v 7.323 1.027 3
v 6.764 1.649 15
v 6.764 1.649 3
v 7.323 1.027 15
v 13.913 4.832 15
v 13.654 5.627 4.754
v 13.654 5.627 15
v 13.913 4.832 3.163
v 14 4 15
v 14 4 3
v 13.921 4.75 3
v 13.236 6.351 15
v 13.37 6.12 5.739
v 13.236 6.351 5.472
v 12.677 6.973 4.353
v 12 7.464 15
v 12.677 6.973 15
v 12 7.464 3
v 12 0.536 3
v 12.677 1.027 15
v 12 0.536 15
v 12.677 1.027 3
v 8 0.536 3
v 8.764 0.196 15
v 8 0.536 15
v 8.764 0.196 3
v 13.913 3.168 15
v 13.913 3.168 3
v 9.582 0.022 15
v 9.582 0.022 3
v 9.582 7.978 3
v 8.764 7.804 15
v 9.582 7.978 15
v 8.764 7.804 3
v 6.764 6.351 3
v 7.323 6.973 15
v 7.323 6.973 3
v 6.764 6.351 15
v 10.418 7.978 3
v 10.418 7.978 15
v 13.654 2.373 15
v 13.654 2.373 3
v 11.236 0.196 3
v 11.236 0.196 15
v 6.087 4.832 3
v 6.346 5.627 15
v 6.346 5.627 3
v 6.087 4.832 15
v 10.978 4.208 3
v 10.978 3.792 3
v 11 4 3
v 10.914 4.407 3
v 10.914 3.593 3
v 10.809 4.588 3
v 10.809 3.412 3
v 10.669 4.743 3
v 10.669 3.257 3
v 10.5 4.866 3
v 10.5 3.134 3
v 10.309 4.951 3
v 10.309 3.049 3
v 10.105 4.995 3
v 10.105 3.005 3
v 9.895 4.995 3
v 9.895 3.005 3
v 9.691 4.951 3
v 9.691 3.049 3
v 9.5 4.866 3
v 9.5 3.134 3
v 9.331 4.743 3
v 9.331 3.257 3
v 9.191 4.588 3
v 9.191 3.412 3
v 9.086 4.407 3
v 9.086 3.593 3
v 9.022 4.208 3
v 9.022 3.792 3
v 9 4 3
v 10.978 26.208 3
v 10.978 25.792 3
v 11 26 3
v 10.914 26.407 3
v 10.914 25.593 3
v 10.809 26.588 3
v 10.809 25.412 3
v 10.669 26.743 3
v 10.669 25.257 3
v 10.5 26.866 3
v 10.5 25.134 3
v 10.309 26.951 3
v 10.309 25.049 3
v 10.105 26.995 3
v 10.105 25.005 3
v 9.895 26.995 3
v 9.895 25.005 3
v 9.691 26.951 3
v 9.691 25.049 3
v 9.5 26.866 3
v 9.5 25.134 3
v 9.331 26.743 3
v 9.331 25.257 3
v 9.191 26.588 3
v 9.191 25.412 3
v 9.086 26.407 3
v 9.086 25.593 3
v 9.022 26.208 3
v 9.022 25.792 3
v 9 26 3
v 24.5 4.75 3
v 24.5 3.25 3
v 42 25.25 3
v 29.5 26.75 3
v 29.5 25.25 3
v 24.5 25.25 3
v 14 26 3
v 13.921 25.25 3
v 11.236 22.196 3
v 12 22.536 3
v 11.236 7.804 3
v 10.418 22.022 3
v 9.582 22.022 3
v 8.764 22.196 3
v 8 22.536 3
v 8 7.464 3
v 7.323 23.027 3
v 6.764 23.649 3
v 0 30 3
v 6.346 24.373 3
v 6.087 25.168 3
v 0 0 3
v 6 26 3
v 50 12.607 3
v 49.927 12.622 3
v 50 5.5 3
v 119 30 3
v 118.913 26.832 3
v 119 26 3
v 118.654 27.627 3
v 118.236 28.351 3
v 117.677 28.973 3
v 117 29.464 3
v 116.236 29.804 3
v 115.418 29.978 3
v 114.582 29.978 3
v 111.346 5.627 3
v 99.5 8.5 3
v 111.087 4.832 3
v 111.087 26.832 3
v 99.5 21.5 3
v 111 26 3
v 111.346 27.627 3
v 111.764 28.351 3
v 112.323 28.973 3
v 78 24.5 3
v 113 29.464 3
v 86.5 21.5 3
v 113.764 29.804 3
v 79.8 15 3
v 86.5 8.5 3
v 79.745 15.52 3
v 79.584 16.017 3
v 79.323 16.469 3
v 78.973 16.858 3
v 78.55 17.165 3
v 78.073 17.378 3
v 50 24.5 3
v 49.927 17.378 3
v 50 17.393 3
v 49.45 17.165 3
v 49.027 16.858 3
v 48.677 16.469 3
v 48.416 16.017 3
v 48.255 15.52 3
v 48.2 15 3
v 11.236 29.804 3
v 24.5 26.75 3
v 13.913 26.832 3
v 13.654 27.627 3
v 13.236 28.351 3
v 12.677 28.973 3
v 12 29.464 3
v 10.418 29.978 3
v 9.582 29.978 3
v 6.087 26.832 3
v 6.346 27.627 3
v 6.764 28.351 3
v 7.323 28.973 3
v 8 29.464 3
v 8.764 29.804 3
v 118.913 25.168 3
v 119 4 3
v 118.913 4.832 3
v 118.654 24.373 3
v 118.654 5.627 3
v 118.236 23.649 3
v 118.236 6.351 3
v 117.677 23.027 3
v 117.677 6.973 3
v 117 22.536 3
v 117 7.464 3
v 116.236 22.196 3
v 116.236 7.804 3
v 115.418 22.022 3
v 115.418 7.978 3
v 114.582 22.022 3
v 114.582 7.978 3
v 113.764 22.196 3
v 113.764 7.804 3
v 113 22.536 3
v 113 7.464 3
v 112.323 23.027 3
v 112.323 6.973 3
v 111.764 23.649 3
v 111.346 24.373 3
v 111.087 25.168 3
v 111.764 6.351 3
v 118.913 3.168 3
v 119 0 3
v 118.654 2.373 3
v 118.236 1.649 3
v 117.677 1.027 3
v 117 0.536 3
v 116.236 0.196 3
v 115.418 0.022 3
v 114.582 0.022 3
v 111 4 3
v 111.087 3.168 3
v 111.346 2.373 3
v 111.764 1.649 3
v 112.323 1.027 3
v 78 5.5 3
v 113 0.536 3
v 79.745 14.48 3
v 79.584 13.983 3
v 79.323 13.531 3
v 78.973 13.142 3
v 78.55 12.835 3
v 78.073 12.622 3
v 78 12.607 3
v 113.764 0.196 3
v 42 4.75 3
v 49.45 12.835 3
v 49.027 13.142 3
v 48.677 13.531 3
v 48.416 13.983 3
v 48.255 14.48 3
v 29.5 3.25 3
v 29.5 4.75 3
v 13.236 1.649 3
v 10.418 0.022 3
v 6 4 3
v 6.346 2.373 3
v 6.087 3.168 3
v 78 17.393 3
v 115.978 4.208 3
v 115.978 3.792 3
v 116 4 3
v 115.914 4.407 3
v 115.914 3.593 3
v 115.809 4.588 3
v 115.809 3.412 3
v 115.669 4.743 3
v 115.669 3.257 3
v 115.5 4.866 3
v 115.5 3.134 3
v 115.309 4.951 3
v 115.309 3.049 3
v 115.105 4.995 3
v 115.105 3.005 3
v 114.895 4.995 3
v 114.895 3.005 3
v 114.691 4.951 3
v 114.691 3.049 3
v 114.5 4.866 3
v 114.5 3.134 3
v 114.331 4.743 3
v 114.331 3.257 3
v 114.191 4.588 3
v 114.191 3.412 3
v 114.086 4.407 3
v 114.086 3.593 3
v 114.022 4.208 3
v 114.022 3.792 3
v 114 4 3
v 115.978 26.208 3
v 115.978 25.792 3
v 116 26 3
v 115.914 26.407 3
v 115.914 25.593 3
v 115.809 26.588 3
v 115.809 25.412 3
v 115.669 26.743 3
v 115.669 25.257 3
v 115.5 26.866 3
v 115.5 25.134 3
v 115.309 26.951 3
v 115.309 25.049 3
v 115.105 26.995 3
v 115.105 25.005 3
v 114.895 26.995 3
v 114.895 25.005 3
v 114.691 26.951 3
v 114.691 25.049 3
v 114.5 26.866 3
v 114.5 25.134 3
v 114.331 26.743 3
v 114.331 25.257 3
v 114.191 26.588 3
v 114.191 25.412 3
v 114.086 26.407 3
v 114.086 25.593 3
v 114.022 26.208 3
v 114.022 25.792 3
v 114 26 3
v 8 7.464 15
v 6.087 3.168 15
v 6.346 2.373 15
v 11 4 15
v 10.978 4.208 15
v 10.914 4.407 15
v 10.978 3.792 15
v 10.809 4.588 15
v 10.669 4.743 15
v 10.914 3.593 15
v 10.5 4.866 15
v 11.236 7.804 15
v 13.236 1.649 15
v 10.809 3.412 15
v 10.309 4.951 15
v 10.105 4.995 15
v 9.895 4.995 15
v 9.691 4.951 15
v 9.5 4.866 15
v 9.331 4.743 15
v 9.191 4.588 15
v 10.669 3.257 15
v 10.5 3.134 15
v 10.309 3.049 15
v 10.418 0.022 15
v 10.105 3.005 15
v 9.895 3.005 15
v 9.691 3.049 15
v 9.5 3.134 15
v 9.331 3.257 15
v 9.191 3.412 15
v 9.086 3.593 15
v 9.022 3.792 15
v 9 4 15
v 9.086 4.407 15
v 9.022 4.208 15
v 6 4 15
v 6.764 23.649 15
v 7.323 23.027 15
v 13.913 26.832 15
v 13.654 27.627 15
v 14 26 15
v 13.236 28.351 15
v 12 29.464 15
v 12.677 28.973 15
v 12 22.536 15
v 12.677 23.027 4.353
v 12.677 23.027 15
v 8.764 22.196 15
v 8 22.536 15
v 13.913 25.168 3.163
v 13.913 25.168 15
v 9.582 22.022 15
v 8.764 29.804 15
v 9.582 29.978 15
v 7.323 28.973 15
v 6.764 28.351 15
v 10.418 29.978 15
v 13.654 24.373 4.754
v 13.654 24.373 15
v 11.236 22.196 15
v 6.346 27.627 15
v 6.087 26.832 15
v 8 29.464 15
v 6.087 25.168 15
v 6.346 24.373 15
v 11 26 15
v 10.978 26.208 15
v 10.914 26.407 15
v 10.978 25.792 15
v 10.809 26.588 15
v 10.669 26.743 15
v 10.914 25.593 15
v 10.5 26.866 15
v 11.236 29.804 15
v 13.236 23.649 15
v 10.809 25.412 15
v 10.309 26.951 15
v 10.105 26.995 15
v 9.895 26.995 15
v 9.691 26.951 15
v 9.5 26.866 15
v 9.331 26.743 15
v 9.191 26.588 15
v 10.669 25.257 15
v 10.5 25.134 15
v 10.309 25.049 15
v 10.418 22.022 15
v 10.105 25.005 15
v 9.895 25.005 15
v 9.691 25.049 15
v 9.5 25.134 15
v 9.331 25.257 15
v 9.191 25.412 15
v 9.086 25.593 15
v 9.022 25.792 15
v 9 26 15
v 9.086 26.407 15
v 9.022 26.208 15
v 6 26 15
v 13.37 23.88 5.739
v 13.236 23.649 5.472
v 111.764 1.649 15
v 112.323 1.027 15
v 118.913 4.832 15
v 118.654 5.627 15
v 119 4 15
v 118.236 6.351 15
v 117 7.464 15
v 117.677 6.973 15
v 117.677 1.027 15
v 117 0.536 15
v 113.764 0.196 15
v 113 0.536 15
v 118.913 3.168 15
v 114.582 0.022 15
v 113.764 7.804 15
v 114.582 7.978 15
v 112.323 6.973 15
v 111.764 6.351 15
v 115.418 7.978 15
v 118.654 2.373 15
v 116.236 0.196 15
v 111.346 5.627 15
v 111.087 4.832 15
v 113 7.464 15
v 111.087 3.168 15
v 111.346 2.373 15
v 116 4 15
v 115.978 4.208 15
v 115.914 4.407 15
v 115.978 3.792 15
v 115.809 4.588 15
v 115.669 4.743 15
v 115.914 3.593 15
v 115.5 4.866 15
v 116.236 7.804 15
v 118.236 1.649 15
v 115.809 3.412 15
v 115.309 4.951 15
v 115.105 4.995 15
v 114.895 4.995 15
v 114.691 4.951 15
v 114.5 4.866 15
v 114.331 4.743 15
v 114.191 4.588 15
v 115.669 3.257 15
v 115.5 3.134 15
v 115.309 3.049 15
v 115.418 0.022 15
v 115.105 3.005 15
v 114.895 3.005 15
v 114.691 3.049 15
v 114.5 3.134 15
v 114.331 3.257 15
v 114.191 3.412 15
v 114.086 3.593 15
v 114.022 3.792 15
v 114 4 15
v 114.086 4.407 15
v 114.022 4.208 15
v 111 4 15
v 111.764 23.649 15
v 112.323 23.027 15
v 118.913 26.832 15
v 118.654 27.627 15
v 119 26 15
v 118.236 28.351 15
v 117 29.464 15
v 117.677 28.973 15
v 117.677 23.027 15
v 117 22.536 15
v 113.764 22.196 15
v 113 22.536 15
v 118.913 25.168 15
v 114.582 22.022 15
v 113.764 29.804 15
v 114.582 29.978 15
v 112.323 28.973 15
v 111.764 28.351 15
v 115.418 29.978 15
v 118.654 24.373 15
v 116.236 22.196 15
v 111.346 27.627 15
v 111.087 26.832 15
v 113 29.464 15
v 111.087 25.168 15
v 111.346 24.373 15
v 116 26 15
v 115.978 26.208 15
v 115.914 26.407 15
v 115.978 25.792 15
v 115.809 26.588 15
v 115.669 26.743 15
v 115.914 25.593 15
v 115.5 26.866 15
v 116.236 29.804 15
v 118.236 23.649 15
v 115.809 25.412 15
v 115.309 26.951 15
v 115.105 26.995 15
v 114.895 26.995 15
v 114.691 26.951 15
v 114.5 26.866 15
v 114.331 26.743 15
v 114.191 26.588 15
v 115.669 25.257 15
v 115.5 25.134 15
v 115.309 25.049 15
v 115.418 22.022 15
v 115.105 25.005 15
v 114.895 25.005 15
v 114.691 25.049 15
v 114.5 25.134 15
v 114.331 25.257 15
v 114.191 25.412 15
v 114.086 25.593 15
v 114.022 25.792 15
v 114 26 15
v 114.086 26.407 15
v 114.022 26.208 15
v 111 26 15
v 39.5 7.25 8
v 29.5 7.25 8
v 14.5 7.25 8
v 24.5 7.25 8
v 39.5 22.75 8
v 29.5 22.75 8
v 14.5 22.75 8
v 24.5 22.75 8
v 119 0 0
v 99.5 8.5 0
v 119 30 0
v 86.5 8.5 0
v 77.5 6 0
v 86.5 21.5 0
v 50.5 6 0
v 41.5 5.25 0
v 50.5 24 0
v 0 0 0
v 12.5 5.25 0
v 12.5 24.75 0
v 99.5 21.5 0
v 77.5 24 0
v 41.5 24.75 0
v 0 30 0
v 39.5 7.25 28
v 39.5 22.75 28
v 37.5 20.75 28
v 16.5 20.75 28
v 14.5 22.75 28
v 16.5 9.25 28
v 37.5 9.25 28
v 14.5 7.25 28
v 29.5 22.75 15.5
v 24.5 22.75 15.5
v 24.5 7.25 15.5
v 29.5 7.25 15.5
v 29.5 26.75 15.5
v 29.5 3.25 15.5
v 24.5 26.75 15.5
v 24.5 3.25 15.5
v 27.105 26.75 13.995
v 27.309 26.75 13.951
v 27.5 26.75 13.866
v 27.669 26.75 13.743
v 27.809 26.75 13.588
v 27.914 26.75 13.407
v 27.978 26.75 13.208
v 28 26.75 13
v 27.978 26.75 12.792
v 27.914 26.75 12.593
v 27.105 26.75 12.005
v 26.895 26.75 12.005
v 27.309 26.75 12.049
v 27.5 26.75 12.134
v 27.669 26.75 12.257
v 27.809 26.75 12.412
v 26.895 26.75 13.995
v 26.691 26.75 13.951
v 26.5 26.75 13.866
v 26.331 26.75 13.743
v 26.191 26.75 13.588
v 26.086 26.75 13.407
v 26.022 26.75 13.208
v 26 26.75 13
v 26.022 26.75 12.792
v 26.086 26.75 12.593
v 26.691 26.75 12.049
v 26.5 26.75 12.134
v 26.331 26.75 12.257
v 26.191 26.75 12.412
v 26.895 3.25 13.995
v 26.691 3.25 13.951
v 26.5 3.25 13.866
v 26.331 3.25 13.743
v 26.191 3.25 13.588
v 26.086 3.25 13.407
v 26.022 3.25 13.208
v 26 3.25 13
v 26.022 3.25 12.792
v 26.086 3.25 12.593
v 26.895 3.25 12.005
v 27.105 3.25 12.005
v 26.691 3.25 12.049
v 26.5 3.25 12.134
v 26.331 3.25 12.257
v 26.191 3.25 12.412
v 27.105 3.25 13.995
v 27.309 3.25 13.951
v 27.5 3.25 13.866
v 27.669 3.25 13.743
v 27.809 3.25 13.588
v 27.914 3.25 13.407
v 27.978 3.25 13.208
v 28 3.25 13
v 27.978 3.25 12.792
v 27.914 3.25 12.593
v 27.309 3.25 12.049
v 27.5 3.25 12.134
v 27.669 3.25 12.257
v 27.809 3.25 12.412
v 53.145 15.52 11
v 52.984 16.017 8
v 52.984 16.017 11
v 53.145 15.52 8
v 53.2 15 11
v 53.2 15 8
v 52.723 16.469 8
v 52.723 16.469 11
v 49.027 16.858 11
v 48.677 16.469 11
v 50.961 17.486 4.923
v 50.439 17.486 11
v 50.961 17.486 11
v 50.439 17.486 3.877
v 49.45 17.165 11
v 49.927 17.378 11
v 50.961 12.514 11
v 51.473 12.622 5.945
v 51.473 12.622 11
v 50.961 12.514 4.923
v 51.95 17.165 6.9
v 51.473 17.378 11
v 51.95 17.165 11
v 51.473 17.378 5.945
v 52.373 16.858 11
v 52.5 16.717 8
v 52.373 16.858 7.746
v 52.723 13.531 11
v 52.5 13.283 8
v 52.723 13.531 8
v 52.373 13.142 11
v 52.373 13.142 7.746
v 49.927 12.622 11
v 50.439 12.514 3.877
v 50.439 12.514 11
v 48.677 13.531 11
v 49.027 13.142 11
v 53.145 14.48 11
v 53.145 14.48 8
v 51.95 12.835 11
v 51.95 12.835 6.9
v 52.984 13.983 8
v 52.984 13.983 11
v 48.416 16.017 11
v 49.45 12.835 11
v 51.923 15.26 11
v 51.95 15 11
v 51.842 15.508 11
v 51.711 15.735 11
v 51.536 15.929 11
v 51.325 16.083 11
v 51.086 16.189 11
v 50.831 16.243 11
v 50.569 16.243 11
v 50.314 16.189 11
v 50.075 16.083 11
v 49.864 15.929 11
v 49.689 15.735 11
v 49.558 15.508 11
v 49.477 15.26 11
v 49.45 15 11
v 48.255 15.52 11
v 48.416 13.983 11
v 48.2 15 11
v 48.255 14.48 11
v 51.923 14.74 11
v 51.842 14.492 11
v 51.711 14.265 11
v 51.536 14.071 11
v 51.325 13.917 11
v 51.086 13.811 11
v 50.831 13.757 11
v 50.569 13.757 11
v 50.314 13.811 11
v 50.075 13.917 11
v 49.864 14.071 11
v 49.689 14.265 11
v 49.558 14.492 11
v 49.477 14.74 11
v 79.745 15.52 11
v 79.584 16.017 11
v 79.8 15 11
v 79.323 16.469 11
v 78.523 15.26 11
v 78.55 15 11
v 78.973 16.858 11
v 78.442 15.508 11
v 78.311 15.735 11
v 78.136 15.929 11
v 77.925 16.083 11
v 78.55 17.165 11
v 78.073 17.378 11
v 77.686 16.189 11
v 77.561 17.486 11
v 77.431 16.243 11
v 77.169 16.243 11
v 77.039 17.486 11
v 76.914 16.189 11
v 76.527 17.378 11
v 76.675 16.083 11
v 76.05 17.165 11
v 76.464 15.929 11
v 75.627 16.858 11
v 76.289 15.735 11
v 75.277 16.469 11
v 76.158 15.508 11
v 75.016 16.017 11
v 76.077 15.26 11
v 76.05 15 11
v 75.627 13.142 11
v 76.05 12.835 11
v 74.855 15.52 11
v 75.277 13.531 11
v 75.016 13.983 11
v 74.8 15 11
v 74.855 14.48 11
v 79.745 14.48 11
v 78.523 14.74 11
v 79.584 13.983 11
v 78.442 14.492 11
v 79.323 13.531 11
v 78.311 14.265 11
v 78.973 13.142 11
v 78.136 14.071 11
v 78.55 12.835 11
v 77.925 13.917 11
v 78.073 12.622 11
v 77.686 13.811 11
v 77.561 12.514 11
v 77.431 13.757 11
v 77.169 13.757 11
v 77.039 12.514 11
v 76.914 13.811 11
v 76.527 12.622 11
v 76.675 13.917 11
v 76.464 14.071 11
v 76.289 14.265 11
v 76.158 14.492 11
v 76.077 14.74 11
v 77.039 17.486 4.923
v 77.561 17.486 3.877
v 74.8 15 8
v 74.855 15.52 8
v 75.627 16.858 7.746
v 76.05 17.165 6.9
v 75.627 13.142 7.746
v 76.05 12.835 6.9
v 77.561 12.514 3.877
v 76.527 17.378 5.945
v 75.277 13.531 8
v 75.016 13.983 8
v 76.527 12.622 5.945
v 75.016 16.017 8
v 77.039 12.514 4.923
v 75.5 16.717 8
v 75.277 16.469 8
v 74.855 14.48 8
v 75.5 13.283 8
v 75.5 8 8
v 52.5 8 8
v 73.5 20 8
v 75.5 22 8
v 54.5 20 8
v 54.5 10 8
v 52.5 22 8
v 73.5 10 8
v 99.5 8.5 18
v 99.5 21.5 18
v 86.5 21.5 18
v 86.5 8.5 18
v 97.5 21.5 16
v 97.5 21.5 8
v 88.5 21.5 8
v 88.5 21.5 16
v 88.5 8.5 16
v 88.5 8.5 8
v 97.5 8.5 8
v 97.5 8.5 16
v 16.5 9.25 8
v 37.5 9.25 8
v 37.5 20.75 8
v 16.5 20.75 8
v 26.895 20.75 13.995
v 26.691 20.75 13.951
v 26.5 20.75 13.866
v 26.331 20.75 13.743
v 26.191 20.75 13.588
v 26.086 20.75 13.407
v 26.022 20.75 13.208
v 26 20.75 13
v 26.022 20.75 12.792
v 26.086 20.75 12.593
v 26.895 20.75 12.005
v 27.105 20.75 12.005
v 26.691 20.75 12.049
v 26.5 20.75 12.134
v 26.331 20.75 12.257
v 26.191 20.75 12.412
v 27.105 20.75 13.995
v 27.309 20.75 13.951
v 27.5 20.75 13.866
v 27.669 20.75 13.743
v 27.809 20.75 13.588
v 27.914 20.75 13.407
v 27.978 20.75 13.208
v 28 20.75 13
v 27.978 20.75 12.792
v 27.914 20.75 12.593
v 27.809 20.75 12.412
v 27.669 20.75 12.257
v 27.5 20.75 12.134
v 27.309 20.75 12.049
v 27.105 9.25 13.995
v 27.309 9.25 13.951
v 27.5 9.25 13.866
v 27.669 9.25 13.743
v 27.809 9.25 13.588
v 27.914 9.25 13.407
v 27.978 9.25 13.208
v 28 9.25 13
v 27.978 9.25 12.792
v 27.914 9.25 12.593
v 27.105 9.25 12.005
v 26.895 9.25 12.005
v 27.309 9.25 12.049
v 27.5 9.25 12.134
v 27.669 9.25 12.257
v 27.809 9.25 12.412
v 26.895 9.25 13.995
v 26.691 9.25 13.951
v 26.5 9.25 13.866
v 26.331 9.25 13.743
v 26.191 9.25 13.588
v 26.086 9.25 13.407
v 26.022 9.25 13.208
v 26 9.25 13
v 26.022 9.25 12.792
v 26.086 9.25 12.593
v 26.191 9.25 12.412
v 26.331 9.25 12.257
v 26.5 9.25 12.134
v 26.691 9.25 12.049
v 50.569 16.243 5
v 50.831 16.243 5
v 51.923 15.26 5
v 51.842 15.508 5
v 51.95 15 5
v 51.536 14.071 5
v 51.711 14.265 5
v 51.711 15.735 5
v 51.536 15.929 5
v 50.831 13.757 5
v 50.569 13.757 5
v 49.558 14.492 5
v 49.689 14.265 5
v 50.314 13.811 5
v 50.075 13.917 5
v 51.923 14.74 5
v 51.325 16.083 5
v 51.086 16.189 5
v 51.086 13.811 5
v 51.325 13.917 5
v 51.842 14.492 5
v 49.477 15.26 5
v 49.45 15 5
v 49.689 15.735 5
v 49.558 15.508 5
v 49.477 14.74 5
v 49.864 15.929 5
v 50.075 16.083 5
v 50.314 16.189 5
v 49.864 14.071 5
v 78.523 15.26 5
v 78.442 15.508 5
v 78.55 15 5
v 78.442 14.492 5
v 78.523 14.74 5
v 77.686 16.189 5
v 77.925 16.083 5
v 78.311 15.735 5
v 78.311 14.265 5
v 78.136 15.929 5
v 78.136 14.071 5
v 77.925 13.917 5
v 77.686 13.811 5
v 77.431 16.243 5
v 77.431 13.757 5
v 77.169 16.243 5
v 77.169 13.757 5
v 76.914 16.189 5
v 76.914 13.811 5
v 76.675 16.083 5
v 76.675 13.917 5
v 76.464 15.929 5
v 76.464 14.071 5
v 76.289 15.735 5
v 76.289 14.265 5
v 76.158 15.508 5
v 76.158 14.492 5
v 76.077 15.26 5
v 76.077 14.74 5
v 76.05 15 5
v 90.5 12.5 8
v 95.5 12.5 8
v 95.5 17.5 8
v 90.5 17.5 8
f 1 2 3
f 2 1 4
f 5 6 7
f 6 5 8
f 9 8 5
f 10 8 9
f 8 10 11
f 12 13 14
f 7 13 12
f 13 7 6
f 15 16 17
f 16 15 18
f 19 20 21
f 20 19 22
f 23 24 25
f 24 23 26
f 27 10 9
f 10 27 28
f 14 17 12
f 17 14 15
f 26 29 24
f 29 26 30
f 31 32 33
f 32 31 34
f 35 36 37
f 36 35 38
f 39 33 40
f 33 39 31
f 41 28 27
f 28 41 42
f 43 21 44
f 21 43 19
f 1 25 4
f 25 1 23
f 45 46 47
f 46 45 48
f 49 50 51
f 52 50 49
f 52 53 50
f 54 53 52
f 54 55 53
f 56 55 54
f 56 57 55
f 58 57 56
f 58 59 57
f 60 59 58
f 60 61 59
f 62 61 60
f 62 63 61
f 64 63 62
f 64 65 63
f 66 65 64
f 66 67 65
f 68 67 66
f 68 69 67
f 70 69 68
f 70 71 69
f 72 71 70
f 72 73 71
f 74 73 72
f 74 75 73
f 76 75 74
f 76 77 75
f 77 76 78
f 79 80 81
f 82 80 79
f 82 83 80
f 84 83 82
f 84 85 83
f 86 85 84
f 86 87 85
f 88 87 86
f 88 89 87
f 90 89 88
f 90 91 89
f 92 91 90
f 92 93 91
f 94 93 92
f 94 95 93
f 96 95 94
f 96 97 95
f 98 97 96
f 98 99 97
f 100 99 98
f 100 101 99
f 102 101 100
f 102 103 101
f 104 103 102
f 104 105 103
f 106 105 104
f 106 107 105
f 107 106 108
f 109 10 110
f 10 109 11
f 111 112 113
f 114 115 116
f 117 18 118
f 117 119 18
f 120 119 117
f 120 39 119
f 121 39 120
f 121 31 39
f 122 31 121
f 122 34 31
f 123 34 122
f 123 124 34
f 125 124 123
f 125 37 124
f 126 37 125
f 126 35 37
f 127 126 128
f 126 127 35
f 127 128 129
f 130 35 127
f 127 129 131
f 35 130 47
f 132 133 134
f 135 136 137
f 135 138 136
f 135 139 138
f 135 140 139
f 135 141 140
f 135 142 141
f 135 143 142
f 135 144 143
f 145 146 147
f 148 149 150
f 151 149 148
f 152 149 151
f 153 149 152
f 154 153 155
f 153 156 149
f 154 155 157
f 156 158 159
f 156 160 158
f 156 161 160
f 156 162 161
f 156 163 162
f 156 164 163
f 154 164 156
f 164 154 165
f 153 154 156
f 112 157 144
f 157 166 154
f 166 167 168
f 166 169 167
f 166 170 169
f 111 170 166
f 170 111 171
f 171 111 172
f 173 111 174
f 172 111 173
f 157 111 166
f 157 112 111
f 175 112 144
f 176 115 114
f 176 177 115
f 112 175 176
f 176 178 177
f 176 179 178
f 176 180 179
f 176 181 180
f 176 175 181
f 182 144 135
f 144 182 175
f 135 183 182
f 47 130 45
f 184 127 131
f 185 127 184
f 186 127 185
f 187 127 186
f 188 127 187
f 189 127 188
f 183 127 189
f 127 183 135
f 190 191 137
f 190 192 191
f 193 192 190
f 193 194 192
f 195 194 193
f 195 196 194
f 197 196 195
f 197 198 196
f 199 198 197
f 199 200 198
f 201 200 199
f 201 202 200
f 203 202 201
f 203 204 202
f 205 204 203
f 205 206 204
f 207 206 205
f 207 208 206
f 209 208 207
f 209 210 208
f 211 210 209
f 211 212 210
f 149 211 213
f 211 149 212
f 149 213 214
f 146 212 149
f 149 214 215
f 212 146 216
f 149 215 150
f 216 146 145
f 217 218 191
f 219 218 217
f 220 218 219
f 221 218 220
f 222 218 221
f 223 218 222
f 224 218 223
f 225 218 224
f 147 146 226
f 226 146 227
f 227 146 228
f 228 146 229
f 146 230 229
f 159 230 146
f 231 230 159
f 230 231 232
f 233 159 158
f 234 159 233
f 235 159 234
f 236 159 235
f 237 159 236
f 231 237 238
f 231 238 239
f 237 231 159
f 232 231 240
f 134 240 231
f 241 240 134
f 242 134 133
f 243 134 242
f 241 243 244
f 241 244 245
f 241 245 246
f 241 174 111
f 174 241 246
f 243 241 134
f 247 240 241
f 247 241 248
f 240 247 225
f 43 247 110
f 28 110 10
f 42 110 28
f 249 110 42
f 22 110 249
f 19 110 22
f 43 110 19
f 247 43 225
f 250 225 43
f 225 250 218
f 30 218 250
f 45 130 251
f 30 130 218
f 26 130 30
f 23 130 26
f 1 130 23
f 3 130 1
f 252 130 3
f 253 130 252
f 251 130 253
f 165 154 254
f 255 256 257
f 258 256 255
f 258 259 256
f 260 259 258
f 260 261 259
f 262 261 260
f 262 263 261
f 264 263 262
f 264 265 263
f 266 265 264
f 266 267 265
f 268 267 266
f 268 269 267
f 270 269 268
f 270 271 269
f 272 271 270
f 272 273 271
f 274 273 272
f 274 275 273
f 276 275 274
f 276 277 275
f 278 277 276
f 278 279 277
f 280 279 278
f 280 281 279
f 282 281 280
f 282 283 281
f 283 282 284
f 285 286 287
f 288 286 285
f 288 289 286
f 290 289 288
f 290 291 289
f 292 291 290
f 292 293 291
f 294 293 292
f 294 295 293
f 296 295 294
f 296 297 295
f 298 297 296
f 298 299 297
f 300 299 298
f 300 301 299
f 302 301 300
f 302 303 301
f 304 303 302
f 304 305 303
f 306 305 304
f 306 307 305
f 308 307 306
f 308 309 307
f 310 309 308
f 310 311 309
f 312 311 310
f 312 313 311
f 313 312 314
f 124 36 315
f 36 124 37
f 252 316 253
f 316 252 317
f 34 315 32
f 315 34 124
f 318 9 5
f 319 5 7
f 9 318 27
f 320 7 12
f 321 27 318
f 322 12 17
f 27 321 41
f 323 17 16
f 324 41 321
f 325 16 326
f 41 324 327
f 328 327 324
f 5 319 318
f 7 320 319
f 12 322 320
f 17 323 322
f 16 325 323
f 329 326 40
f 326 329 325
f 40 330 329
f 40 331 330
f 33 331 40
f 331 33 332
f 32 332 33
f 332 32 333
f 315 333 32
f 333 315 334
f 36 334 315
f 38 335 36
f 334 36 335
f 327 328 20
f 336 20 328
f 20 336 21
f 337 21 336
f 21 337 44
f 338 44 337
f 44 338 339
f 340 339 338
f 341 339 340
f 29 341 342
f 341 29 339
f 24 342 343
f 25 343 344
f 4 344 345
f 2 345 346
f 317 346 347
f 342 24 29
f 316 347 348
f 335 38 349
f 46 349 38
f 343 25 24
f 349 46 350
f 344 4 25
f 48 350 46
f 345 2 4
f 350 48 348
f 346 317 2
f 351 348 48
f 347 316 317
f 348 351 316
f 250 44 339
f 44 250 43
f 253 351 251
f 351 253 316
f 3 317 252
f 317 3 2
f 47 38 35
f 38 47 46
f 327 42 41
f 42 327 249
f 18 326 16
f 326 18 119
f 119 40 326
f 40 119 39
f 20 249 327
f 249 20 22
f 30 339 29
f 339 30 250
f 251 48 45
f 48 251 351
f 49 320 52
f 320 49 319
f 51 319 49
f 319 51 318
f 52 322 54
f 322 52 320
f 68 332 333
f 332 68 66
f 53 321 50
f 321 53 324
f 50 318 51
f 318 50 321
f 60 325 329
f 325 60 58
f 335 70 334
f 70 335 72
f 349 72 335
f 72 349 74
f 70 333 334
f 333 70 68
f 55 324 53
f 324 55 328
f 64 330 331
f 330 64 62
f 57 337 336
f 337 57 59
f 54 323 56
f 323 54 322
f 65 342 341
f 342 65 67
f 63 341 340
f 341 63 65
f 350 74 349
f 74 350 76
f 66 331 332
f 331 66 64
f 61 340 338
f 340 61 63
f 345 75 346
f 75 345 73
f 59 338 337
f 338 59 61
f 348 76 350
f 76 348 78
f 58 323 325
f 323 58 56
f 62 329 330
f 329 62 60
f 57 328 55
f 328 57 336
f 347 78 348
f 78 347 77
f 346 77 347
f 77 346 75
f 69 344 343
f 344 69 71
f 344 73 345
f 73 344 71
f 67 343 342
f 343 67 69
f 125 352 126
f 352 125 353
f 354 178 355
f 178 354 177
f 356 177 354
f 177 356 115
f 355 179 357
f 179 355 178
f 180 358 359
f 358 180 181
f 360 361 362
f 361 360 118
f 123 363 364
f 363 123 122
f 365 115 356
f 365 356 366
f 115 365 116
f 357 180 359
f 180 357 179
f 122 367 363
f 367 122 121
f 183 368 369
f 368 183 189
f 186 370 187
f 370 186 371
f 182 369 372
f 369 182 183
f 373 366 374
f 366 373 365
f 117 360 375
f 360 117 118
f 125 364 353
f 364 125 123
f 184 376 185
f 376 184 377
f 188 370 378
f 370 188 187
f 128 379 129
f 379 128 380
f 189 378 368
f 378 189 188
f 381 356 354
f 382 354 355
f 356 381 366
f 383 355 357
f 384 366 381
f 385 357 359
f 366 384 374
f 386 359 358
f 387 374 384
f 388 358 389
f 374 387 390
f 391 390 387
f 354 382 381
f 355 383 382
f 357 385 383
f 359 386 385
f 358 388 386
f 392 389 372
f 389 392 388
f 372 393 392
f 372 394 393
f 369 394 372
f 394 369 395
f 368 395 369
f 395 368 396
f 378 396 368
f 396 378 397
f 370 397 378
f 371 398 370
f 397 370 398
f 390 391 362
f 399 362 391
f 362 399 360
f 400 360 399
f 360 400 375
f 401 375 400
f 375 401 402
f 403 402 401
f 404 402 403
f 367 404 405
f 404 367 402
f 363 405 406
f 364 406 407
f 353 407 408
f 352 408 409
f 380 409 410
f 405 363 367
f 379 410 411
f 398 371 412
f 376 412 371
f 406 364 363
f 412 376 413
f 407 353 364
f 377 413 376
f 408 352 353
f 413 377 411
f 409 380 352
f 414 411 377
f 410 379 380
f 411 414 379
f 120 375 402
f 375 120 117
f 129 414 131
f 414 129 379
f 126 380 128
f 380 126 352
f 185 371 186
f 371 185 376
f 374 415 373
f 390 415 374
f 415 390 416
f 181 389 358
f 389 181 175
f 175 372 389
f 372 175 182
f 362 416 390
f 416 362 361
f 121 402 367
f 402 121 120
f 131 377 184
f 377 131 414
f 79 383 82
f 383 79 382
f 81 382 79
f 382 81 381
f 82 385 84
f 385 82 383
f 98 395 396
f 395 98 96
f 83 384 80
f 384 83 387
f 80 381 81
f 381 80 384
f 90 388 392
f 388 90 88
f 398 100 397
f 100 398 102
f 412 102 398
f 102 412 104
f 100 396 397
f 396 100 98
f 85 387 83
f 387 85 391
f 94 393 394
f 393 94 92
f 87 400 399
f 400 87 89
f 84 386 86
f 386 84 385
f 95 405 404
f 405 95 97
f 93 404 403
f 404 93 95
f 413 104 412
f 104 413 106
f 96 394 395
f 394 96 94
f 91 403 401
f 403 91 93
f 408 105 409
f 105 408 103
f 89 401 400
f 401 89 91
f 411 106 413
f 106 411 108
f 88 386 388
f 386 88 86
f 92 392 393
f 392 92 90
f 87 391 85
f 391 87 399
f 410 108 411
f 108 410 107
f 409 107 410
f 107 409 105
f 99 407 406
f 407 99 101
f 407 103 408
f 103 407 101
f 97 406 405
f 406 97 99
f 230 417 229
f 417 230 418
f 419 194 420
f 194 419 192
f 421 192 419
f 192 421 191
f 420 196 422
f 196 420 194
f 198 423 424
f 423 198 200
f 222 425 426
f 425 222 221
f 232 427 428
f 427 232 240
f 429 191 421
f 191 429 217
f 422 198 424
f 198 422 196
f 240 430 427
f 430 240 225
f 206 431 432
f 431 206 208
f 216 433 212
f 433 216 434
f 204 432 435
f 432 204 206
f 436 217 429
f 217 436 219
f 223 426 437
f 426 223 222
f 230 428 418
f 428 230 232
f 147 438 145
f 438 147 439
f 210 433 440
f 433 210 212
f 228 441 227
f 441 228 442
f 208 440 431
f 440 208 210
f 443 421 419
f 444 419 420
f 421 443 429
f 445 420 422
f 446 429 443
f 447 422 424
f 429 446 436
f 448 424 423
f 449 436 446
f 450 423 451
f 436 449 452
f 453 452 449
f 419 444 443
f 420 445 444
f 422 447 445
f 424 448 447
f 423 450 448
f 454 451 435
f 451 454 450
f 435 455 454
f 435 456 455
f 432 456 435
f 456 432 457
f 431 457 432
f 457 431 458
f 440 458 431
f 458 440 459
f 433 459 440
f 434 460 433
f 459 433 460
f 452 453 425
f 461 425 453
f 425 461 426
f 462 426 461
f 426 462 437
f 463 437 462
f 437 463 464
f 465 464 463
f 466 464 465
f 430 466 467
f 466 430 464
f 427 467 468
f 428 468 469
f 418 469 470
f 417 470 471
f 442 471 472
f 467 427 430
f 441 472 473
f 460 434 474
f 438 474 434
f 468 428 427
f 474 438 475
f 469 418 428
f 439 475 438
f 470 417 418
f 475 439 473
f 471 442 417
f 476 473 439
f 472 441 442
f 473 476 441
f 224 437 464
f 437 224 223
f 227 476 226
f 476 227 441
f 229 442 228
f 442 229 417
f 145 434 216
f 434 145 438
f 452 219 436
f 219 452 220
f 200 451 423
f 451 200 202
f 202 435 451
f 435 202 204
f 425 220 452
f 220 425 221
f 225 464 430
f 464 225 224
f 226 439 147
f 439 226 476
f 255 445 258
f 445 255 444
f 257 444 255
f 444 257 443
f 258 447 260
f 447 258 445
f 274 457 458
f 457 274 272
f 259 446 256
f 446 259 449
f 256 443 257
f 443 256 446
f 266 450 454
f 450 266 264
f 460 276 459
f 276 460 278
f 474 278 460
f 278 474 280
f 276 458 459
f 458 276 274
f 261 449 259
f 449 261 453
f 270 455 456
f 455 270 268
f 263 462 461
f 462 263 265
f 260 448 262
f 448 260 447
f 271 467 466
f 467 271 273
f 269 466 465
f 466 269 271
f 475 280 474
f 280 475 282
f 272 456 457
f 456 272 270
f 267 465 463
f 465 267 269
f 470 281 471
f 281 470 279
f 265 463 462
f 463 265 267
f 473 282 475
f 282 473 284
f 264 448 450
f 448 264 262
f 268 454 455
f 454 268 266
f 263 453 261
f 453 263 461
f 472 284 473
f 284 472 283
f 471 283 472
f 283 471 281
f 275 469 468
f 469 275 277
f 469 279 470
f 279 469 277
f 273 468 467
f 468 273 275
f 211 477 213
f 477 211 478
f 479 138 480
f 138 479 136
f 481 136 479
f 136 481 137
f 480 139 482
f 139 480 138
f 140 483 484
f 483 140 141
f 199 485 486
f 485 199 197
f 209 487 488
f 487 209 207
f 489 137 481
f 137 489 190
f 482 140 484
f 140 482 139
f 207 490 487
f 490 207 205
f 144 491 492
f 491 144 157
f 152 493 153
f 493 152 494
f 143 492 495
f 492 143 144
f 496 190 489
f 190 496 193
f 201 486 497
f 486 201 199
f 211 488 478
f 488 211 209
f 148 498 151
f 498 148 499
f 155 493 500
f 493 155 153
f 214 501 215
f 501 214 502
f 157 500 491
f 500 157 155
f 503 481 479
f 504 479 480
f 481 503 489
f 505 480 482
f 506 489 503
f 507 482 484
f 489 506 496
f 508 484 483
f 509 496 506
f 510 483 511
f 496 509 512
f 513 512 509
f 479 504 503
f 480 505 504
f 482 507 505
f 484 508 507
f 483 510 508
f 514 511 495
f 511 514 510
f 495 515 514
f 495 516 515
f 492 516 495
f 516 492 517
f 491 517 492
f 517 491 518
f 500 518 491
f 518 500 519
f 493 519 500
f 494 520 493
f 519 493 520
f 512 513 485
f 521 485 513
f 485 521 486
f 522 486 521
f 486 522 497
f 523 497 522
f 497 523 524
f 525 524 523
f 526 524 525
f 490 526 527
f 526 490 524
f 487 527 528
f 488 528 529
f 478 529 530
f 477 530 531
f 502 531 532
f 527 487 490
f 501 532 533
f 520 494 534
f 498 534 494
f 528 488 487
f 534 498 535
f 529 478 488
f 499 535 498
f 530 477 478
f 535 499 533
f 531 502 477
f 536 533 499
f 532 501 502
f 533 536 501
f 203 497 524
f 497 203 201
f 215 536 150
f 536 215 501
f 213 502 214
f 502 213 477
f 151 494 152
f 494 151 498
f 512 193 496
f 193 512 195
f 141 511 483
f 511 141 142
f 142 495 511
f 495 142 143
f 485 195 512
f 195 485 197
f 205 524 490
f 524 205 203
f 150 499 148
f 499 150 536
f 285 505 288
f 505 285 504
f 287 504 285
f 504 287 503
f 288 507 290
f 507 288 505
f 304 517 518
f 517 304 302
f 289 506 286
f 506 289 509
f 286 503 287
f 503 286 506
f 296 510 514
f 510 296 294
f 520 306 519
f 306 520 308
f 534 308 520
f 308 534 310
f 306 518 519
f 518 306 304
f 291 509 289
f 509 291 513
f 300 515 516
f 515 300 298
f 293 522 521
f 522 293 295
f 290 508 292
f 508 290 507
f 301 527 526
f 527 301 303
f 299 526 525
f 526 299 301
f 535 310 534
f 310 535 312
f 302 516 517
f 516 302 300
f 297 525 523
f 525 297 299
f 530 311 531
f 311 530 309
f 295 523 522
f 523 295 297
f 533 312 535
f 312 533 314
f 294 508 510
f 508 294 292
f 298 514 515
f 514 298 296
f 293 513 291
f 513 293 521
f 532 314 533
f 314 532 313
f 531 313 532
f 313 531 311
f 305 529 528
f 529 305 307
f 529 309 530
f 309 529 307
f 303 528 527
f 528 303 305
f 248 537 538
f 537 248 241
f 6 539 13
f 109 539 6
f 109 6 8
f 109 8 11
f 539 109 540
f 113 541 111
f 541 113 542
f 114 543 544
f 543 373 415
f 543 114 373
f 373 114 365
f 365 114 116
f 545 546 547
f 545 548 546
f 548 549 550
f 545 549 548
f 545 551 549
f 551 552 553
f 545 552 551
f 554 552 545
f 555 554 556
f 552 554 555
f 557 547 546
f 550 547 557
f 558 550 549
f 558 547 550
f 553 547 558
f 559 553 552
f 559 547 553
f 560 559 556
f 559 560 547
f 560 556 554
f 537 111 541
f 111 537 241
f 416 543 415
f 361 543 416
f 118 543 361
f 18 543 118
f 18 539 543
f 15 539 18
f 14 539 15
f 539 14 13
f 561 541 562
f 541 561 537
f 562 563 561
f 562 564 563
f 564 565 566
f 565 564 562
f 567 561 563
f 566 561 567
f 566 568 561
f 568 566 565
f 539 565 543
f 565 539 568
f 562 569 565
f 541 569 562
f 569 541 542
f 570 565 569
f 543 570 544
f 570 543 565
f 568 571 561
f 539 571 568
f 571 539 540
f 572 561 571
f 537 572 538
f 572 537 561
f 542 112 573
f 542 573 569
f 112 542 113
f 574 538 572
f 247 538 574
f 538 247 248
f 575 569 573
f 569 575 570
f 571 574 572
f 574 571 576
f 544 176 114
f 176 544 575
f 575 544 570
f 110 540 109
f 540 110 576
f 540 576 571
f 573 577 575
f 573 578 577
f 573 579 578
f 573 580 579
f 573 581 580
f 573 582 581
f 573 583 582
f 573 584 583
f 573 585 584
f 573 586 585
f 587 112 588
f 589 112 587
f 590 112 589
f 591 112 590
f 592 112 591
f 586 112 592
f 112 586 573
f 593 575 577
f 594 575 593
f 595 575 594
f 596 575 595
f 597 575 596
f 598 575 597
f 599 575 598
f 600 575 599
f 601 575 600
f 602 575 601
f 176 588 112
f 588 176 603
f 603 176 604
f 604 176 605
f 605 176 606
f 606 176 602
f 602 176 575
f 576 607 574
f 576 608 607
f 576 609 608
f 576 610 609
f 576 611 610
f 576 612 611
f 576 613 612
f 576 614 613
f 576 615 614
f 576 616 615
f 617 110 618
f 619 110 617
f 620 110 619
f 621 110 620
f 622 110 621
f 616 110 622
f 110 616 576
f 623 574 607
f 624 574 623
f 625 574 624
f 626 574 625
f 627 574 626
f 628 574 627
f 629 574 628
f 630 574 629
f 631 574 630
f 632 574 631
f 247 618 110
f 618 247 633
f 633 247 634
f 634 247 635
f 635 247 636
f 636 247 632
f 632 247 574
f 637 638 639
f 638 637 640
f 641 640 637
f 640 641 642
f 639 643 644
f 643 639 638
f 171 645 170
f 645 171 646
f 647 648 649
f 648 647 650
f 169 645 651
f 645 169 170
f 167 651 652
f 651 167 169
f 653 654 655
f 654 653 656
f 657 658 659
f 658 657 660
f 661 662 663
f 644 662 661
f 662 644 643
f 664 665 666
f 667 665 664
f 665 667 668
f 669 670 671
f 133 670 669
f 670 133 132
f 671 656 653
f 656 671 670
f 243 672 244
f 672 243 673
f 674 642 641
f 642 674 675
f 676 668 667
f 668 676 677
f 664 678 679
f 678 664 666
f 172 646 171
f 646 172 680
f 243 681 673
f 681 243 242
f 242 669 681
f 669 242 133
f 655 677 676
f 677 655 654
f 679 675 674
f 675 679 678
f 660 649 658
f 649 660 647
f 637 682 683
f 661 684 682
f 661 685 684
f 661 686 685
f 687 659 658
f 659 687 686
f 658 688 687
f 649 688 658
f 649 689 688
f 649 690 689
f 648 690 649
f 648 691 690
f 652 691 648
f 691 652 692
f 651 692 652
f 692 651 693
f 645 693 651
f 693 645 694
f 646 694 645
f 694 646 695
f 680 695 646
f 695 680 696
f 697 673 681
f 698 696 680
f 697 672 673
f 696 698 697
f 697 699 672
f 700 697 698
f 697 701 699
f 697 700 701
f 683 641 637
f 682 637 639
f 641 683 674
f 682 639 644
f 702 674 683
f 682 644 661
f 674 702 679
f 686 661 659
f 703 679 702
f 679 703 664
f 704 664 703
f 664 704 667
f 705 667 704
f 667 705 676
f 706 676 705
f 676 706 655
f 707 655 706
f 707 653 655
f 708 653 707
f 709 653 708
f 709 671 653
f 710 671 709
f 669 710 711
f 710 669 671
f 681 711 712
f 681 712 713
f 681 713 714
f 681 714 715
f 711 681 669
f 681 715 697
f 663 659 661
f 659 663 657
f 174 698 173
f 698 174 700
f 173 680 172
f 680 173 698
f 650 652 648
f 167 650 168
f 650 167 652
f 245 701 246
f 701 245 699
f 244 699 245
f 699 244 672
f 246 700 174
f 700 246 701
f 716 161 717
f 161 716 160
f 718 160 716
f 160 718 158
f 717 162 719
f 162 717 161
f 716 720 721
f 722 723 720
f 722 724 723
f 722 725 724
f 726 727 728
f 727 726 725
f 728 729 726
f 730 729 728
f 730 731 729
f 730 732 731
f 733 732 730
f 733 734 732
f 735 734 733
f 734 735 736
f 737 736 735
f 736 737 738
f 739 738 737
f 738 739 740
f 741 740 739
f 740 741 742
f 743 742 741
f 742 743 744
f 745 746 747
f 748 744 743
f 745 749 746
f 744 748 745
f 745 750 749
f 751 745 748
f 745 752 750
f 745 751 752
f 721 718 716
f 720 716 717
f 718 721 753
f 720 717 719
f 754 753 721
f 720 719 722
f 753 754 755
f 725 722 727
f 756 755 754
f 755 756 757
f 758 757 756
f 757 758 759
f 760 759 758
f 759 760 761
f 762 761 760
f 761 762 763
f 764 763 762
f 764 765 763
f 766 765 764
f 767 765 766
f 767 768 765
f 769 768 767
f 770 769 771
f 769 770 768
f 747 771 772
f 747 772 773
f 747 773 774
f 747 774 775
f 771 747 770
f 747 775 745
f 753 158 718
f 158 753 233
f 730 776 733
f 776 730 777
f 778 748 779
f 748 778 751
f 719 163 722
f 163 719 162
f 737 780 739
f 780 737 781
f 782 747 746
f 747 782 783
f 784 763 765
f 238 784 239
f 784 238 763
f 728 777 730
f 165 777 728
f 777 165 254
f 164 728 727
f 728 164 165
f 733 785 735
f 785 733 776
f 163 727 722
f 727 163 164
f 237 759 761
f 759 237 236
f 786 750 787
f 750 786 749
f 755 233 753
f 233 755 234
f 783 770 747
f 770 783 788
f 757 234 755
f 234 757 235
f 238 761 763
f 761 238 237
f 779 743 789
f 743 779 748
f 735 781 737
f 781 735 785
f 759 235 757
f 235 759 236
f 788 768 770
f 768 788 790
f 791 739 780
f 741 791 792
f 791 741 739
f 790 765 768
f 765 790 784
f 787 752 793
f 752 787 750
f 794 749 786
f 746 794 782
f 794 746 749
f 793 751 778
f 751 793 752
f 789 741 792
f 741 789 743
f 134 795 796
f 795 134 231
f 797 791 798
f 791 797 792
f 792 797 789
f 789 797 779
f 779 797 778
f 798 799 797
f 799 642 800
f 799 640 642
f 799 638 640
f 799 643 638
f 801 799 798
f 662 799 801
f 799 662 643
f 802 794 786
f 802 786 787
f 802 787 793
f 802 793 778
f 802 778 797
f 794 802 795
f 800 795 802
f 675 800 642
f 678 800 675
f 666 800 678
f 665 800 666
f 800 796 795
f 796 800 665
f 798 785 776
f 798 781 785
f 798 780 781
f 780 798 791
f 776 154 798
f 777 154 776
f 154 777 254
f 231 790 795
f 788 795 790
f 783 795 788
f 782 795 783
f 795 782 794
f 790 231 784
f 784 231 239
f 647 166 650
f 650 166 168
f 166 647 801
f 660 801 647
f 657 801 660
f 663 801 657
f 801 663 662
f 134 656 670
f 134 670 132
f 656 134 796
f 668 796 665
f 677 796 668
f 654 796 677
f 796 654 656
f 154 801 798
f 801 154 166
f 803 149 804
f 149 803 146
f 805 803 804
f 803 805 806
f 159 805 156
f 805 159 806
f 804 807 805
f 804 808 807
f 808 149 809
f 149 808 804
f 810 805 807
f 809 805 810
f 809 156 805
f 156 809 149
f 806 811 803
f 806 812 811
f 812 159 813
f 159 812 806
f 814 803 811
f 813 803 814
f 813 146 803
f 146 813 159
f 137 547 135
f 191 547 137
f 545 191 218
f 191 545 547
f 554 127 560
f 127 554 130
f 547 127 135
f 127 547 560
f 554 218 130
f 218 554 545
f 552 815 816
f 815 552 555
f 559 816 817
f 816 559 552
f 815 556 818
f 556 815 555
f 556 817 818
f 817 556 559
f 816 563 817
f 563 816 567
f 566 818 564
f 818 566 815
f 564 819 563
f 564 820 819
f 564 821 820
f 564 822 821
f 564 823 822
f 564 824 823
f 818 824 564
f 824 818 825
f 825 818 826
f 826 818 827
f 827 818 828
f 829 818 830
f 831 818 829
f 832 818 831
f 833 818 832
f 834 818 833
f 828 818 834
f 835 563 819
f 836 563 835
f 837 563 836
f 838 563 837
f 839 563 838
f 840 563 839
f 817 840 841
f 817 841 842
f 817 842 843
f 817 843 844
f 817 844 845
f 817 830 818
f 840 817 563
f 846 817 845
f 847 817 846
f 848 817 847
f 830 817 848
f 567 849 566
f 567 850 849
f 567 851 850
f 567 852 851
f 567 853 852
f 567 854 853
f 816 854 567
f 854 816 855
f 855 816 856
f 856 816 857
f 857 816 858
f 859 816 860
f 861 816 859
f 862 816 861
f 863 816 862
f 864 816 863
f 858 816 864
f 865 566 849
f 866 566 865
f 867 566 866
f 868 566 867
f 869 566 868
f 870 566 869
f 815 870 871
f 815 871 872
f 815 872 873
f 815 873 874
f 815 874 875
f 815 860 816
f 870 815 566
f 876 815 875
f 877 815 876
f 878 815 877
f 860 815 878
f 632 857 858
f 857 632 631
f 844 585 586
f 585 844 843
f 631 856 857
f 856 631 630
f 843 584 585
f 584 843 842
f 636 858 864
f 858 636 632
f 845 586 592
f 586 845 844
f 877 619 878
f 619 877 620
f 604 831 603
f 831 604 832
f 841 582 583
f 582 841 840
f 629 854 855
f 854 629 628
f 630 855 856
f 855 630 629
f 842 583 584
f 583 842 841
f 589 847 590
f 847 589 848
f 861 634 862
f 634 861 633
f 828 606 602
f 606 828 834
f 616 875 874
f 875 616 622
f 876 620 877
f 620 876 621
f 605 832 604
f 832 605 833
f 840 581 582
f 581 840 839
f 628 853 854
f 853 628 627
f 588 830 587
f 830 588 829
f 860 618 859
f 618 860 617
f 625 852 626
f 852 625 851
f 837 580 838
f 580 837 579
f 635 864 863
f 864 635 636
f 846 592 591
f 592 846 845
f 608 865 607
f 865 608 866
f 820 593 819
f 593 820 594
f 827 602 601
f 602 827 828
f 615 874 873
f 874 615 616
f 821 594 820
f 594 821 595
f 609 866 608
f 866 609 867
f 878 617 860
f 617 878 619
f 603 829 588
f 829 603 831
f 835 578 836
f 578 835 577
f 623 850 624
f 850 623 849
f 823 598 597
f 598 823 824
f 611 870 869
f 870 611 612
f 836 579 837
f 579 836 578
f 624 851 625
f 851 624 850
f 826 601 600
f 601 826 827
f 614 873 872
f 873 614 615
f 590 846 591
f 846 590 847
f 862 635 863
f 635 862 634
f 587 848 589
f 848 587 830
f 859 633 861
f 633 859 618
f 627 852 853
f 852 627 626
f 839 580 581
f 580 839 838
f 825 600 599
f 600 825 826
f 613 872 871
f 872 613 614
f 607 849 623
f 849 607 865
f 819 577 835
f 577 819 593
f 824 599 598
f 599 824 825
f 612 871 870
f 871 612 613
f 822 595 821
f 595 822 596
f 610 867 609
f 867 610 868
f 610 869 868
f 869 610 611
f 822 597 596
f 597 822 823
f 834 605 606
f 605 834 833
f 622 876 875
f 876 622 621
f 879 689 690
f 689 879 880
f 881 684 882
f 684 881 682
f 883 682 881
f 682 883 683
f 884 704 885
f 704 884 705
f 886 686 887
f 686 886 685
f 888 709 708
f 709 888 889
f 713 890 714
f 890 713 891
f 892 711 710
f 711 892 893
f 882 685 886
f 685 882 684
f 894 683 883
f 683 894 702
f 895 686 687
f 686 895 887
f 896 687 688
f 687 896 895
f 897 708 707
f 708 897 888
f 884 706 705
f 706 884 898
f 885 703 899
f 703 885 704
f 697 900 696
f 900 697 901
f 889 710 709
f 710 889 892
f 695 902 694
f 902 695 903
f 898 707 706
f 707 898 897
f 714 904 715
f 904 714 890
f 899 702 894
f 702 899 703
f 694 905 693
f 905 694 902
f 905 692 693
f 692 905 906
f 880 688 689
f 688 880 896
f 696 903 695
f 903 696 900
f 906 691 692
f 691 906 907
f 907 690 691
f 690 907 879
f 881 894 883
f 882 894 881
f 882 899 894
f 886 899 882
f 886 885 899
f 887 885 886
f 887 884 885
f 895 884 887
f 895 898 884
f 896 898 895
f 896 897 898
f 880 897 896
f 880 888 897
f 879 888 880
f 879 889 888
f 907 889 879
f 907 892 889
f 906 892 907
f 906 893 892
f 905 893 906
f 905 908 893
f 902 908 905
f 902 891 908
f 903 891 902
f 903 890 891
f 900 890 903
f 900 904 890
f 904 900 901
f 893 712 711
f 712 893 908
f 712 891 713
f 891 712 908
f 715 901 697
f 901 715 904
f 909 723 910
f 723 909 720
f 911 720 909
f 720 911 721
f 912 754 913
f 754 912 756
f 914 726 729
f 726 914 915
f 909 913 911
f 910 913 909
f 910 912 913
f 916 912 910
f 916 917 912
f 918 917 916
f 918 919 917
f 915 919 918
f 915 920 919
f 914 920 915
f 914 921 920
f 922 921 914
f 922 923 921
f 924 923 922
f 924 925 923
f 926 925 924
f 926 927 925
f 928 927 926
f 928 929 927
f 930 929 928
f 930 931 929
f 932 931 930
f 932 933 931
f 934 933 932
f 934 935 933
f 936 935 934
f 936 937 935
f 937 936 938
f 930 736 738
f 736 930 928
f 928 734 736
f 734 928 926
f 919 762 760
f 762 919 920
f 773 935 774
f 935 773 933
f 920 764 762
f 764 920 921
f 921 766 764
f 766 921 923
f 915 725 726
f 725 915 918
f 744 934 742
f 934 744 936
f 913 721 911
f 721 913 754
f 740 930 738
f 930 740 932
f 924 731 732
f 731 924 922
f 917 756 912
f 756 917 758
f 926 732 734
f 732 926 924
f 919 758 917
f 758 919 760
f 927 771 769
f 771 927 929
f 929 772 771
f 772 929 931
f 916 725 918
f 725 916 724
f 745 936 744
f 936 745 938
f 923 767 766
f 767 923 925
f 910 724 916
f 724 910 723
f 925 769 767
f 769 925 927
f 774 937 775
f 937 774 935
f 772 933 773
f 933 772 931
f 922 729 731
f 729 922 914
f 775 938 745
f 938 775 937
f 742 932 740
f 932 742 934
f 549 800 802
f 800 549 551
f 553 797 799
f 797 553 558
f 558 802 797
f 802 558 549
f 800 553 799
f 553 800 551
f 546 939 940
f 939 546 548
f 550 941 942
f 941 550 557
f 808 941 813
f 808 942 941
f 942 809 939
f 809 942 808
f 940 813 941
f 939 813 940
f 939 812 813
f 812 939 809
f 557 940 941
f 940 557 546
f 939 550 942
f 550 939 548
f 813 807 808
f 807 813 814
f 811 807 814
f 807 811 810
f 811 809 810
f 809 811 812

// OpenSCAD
// file: util.scad
_screw_post_dia = 10;
_screw_post_height = 10;

_panel_screw_z1 = 4;  // From bottom of panel.
_panel_screw_z2 = 26;
_panel_screw_y = 15; // From front of panel.

module screwPost(hole)
{
	screw_slope_z = 2.8;
	screw_dia = 4.5;
	screw_head = 9;

	if (hole)
	{
		$fn = 20;
		cylinder(h=_screw_post_height+1, d=screw_dia);
		
		translate([0, 0, _screw_post_height - screw_slope_z])
		cylinder(h=screw_slope_z, d1=screw_dia, d2=screw_head);
	}
	else
	{
		cylinder(h=_screw_post_height, d=_screw_post_dia);
	}
}

module centred_cube(size, centred = [1, 1, 0])
{
	c = centred;
	translate([c.x ? -size.x : 0, c.y ? -size.y : 0, c.z ? -size.z : 0] / 2)
	cube(size);
}

module centred_cube_x(size)
{
	centred_cube(size, [1, 0, 0]);
}

module centred_cube_y(size)
{
	centred_cube(size, [0, 1, 0]);
}

module hexahedron(verts)
{
    faces = 
    [
        [3, 2, 1, 0], // Bottom
        [4, 5, 6, 7], // Top
        [0, 4, 7, 3], // Front
        [3, 7, 6, 2], // Right
        [2, 6, 5, 1], // Back
        [1, 5, 4, 0], // Left
    ];

	polyhedron(verts, faces);
}

module frustum(x1, y1, x2, y2, h)
{
    verts = 
    [
        [-x1 / 2, -y1 / 2, 0], [-x1 / 2, y1 / 2, 0], [x1 / 2, y1 / 2, 0], [x1 / 2, -y1 / 2, 0],
        [-x2 / 2, -y2 / 2, h], [-x2 / 2, y2 / 2, h], [x2 / 2, y2 / 2, h], [x2 / 2, -y2 / 2, h],
    ];

	hexahedron(verts);
}
// main file
$fs = 0.1;

_size = [119, 30];
_thickness = 3;
_tube_thickness = 2;
_bevel_height = 8; // Includes panel.

_post_inner = 2;
_post_outer = 8;
_post_inset = 6;

_hmdi_size = [21, 11.5, 20];
_power_size = [19, 10];

_power_hole_x = 26.6; // Distance between centres.

include <util.scad>

module posts(x)
{
	module post()
	{
		difference()
		{
			h = _panel_screw_y - _thickness;
			cylinder(d = _post_outer, h = h);
			cylinder(d = _post_inner, h = h + 1);
		}
	}	

	for (y = [_panel_screw_z1, _panel_screw_z2])
		translate([x, y, _thickness]) post();
}	

module hdmi(hole)
{
	size = _hmdi_size;
	hole_z = _bevel_height + 5;
	boss_width = 5;
	boss_height = 4;

	module shape(add)
	{
		frustum(size.x + _bevel_height + add, size.y + _bevel_height + add, size.x + add, size.y + add, _bevel_height);
		translate([0, 0, _bevel_height]) centred_cube(size + [add, add, 0]);
	}

	shape(hole ? 0 : _tube_thickness * 2);

	if (hole)
		translate([0, 0, hole_z]) rotate([-90, 0, 0]) cylinder(d = 2, h = size.y + 20, center = true);
	else
		centred_cube([boss_width, size.y + (_tube_thickness + boss_height) * 2, hole_z + boss_width / 2]);
}	

module power(hole)
{
	size = _power_size;
	boss_width = 5;
	boss_height = 3;

	module shape(add)
	{
		frustum(size.x + _bevel_height + add, size.y + _bevel_height + add, size.x + add, size.y + add, _bevel_height);
	}

	shape(hole ? 0 : _tube_thickness * 2);

	for (x = [-_power_hole_x / 2, _power_hole_x / 2])
		translate([x, 0, _thickness + (hole ? 2 : 0)]) cylinder(d = hole ? 2.5 : boss_width, h = _bevel_height - _thickness + boss_height);
}	

module remote(hole)
{
	hole_size = [5, 5];
	block_size = hole_size + [_bevel_height, _bevel_height];
	gap = 8;

	if (hole)
	{
		frustum(block_size.x, block_size.y, hole_size.x, hole_size.y, _bevel_height);
		translate([0, 0, _bevel_height]) centred_cube([block_size.x - 4, block_size.y, gap]);
	}
	else
		centred_cube([block_size.x, block_size.y, _bevel_height + gap + 2]);
}	

module panel()
{
	module objects(hole)
	{
		translate([21 + _post_inset, 15, 0]) hdmi(hole);
		translate([58 + _post_inset, 15, 0]) power(hole);
		translate([87 + _post_inset, 15, 0]) remote(hole);
	}

	difference()
	{
		union()
		{
			cube([_size.x, _size.y, _thickness]);

			posts(_post_outer / 2 + _post_inset);
			posts(_size.x - _post_outer / 2);
			
			objects(false);
		}

		objects(true);
	}
}

module test()
{
	intersection()
	{
		panel();
		translate([0, 0, 0]) cube([80, 30, 50]);
	}
}

panel();
//test();
